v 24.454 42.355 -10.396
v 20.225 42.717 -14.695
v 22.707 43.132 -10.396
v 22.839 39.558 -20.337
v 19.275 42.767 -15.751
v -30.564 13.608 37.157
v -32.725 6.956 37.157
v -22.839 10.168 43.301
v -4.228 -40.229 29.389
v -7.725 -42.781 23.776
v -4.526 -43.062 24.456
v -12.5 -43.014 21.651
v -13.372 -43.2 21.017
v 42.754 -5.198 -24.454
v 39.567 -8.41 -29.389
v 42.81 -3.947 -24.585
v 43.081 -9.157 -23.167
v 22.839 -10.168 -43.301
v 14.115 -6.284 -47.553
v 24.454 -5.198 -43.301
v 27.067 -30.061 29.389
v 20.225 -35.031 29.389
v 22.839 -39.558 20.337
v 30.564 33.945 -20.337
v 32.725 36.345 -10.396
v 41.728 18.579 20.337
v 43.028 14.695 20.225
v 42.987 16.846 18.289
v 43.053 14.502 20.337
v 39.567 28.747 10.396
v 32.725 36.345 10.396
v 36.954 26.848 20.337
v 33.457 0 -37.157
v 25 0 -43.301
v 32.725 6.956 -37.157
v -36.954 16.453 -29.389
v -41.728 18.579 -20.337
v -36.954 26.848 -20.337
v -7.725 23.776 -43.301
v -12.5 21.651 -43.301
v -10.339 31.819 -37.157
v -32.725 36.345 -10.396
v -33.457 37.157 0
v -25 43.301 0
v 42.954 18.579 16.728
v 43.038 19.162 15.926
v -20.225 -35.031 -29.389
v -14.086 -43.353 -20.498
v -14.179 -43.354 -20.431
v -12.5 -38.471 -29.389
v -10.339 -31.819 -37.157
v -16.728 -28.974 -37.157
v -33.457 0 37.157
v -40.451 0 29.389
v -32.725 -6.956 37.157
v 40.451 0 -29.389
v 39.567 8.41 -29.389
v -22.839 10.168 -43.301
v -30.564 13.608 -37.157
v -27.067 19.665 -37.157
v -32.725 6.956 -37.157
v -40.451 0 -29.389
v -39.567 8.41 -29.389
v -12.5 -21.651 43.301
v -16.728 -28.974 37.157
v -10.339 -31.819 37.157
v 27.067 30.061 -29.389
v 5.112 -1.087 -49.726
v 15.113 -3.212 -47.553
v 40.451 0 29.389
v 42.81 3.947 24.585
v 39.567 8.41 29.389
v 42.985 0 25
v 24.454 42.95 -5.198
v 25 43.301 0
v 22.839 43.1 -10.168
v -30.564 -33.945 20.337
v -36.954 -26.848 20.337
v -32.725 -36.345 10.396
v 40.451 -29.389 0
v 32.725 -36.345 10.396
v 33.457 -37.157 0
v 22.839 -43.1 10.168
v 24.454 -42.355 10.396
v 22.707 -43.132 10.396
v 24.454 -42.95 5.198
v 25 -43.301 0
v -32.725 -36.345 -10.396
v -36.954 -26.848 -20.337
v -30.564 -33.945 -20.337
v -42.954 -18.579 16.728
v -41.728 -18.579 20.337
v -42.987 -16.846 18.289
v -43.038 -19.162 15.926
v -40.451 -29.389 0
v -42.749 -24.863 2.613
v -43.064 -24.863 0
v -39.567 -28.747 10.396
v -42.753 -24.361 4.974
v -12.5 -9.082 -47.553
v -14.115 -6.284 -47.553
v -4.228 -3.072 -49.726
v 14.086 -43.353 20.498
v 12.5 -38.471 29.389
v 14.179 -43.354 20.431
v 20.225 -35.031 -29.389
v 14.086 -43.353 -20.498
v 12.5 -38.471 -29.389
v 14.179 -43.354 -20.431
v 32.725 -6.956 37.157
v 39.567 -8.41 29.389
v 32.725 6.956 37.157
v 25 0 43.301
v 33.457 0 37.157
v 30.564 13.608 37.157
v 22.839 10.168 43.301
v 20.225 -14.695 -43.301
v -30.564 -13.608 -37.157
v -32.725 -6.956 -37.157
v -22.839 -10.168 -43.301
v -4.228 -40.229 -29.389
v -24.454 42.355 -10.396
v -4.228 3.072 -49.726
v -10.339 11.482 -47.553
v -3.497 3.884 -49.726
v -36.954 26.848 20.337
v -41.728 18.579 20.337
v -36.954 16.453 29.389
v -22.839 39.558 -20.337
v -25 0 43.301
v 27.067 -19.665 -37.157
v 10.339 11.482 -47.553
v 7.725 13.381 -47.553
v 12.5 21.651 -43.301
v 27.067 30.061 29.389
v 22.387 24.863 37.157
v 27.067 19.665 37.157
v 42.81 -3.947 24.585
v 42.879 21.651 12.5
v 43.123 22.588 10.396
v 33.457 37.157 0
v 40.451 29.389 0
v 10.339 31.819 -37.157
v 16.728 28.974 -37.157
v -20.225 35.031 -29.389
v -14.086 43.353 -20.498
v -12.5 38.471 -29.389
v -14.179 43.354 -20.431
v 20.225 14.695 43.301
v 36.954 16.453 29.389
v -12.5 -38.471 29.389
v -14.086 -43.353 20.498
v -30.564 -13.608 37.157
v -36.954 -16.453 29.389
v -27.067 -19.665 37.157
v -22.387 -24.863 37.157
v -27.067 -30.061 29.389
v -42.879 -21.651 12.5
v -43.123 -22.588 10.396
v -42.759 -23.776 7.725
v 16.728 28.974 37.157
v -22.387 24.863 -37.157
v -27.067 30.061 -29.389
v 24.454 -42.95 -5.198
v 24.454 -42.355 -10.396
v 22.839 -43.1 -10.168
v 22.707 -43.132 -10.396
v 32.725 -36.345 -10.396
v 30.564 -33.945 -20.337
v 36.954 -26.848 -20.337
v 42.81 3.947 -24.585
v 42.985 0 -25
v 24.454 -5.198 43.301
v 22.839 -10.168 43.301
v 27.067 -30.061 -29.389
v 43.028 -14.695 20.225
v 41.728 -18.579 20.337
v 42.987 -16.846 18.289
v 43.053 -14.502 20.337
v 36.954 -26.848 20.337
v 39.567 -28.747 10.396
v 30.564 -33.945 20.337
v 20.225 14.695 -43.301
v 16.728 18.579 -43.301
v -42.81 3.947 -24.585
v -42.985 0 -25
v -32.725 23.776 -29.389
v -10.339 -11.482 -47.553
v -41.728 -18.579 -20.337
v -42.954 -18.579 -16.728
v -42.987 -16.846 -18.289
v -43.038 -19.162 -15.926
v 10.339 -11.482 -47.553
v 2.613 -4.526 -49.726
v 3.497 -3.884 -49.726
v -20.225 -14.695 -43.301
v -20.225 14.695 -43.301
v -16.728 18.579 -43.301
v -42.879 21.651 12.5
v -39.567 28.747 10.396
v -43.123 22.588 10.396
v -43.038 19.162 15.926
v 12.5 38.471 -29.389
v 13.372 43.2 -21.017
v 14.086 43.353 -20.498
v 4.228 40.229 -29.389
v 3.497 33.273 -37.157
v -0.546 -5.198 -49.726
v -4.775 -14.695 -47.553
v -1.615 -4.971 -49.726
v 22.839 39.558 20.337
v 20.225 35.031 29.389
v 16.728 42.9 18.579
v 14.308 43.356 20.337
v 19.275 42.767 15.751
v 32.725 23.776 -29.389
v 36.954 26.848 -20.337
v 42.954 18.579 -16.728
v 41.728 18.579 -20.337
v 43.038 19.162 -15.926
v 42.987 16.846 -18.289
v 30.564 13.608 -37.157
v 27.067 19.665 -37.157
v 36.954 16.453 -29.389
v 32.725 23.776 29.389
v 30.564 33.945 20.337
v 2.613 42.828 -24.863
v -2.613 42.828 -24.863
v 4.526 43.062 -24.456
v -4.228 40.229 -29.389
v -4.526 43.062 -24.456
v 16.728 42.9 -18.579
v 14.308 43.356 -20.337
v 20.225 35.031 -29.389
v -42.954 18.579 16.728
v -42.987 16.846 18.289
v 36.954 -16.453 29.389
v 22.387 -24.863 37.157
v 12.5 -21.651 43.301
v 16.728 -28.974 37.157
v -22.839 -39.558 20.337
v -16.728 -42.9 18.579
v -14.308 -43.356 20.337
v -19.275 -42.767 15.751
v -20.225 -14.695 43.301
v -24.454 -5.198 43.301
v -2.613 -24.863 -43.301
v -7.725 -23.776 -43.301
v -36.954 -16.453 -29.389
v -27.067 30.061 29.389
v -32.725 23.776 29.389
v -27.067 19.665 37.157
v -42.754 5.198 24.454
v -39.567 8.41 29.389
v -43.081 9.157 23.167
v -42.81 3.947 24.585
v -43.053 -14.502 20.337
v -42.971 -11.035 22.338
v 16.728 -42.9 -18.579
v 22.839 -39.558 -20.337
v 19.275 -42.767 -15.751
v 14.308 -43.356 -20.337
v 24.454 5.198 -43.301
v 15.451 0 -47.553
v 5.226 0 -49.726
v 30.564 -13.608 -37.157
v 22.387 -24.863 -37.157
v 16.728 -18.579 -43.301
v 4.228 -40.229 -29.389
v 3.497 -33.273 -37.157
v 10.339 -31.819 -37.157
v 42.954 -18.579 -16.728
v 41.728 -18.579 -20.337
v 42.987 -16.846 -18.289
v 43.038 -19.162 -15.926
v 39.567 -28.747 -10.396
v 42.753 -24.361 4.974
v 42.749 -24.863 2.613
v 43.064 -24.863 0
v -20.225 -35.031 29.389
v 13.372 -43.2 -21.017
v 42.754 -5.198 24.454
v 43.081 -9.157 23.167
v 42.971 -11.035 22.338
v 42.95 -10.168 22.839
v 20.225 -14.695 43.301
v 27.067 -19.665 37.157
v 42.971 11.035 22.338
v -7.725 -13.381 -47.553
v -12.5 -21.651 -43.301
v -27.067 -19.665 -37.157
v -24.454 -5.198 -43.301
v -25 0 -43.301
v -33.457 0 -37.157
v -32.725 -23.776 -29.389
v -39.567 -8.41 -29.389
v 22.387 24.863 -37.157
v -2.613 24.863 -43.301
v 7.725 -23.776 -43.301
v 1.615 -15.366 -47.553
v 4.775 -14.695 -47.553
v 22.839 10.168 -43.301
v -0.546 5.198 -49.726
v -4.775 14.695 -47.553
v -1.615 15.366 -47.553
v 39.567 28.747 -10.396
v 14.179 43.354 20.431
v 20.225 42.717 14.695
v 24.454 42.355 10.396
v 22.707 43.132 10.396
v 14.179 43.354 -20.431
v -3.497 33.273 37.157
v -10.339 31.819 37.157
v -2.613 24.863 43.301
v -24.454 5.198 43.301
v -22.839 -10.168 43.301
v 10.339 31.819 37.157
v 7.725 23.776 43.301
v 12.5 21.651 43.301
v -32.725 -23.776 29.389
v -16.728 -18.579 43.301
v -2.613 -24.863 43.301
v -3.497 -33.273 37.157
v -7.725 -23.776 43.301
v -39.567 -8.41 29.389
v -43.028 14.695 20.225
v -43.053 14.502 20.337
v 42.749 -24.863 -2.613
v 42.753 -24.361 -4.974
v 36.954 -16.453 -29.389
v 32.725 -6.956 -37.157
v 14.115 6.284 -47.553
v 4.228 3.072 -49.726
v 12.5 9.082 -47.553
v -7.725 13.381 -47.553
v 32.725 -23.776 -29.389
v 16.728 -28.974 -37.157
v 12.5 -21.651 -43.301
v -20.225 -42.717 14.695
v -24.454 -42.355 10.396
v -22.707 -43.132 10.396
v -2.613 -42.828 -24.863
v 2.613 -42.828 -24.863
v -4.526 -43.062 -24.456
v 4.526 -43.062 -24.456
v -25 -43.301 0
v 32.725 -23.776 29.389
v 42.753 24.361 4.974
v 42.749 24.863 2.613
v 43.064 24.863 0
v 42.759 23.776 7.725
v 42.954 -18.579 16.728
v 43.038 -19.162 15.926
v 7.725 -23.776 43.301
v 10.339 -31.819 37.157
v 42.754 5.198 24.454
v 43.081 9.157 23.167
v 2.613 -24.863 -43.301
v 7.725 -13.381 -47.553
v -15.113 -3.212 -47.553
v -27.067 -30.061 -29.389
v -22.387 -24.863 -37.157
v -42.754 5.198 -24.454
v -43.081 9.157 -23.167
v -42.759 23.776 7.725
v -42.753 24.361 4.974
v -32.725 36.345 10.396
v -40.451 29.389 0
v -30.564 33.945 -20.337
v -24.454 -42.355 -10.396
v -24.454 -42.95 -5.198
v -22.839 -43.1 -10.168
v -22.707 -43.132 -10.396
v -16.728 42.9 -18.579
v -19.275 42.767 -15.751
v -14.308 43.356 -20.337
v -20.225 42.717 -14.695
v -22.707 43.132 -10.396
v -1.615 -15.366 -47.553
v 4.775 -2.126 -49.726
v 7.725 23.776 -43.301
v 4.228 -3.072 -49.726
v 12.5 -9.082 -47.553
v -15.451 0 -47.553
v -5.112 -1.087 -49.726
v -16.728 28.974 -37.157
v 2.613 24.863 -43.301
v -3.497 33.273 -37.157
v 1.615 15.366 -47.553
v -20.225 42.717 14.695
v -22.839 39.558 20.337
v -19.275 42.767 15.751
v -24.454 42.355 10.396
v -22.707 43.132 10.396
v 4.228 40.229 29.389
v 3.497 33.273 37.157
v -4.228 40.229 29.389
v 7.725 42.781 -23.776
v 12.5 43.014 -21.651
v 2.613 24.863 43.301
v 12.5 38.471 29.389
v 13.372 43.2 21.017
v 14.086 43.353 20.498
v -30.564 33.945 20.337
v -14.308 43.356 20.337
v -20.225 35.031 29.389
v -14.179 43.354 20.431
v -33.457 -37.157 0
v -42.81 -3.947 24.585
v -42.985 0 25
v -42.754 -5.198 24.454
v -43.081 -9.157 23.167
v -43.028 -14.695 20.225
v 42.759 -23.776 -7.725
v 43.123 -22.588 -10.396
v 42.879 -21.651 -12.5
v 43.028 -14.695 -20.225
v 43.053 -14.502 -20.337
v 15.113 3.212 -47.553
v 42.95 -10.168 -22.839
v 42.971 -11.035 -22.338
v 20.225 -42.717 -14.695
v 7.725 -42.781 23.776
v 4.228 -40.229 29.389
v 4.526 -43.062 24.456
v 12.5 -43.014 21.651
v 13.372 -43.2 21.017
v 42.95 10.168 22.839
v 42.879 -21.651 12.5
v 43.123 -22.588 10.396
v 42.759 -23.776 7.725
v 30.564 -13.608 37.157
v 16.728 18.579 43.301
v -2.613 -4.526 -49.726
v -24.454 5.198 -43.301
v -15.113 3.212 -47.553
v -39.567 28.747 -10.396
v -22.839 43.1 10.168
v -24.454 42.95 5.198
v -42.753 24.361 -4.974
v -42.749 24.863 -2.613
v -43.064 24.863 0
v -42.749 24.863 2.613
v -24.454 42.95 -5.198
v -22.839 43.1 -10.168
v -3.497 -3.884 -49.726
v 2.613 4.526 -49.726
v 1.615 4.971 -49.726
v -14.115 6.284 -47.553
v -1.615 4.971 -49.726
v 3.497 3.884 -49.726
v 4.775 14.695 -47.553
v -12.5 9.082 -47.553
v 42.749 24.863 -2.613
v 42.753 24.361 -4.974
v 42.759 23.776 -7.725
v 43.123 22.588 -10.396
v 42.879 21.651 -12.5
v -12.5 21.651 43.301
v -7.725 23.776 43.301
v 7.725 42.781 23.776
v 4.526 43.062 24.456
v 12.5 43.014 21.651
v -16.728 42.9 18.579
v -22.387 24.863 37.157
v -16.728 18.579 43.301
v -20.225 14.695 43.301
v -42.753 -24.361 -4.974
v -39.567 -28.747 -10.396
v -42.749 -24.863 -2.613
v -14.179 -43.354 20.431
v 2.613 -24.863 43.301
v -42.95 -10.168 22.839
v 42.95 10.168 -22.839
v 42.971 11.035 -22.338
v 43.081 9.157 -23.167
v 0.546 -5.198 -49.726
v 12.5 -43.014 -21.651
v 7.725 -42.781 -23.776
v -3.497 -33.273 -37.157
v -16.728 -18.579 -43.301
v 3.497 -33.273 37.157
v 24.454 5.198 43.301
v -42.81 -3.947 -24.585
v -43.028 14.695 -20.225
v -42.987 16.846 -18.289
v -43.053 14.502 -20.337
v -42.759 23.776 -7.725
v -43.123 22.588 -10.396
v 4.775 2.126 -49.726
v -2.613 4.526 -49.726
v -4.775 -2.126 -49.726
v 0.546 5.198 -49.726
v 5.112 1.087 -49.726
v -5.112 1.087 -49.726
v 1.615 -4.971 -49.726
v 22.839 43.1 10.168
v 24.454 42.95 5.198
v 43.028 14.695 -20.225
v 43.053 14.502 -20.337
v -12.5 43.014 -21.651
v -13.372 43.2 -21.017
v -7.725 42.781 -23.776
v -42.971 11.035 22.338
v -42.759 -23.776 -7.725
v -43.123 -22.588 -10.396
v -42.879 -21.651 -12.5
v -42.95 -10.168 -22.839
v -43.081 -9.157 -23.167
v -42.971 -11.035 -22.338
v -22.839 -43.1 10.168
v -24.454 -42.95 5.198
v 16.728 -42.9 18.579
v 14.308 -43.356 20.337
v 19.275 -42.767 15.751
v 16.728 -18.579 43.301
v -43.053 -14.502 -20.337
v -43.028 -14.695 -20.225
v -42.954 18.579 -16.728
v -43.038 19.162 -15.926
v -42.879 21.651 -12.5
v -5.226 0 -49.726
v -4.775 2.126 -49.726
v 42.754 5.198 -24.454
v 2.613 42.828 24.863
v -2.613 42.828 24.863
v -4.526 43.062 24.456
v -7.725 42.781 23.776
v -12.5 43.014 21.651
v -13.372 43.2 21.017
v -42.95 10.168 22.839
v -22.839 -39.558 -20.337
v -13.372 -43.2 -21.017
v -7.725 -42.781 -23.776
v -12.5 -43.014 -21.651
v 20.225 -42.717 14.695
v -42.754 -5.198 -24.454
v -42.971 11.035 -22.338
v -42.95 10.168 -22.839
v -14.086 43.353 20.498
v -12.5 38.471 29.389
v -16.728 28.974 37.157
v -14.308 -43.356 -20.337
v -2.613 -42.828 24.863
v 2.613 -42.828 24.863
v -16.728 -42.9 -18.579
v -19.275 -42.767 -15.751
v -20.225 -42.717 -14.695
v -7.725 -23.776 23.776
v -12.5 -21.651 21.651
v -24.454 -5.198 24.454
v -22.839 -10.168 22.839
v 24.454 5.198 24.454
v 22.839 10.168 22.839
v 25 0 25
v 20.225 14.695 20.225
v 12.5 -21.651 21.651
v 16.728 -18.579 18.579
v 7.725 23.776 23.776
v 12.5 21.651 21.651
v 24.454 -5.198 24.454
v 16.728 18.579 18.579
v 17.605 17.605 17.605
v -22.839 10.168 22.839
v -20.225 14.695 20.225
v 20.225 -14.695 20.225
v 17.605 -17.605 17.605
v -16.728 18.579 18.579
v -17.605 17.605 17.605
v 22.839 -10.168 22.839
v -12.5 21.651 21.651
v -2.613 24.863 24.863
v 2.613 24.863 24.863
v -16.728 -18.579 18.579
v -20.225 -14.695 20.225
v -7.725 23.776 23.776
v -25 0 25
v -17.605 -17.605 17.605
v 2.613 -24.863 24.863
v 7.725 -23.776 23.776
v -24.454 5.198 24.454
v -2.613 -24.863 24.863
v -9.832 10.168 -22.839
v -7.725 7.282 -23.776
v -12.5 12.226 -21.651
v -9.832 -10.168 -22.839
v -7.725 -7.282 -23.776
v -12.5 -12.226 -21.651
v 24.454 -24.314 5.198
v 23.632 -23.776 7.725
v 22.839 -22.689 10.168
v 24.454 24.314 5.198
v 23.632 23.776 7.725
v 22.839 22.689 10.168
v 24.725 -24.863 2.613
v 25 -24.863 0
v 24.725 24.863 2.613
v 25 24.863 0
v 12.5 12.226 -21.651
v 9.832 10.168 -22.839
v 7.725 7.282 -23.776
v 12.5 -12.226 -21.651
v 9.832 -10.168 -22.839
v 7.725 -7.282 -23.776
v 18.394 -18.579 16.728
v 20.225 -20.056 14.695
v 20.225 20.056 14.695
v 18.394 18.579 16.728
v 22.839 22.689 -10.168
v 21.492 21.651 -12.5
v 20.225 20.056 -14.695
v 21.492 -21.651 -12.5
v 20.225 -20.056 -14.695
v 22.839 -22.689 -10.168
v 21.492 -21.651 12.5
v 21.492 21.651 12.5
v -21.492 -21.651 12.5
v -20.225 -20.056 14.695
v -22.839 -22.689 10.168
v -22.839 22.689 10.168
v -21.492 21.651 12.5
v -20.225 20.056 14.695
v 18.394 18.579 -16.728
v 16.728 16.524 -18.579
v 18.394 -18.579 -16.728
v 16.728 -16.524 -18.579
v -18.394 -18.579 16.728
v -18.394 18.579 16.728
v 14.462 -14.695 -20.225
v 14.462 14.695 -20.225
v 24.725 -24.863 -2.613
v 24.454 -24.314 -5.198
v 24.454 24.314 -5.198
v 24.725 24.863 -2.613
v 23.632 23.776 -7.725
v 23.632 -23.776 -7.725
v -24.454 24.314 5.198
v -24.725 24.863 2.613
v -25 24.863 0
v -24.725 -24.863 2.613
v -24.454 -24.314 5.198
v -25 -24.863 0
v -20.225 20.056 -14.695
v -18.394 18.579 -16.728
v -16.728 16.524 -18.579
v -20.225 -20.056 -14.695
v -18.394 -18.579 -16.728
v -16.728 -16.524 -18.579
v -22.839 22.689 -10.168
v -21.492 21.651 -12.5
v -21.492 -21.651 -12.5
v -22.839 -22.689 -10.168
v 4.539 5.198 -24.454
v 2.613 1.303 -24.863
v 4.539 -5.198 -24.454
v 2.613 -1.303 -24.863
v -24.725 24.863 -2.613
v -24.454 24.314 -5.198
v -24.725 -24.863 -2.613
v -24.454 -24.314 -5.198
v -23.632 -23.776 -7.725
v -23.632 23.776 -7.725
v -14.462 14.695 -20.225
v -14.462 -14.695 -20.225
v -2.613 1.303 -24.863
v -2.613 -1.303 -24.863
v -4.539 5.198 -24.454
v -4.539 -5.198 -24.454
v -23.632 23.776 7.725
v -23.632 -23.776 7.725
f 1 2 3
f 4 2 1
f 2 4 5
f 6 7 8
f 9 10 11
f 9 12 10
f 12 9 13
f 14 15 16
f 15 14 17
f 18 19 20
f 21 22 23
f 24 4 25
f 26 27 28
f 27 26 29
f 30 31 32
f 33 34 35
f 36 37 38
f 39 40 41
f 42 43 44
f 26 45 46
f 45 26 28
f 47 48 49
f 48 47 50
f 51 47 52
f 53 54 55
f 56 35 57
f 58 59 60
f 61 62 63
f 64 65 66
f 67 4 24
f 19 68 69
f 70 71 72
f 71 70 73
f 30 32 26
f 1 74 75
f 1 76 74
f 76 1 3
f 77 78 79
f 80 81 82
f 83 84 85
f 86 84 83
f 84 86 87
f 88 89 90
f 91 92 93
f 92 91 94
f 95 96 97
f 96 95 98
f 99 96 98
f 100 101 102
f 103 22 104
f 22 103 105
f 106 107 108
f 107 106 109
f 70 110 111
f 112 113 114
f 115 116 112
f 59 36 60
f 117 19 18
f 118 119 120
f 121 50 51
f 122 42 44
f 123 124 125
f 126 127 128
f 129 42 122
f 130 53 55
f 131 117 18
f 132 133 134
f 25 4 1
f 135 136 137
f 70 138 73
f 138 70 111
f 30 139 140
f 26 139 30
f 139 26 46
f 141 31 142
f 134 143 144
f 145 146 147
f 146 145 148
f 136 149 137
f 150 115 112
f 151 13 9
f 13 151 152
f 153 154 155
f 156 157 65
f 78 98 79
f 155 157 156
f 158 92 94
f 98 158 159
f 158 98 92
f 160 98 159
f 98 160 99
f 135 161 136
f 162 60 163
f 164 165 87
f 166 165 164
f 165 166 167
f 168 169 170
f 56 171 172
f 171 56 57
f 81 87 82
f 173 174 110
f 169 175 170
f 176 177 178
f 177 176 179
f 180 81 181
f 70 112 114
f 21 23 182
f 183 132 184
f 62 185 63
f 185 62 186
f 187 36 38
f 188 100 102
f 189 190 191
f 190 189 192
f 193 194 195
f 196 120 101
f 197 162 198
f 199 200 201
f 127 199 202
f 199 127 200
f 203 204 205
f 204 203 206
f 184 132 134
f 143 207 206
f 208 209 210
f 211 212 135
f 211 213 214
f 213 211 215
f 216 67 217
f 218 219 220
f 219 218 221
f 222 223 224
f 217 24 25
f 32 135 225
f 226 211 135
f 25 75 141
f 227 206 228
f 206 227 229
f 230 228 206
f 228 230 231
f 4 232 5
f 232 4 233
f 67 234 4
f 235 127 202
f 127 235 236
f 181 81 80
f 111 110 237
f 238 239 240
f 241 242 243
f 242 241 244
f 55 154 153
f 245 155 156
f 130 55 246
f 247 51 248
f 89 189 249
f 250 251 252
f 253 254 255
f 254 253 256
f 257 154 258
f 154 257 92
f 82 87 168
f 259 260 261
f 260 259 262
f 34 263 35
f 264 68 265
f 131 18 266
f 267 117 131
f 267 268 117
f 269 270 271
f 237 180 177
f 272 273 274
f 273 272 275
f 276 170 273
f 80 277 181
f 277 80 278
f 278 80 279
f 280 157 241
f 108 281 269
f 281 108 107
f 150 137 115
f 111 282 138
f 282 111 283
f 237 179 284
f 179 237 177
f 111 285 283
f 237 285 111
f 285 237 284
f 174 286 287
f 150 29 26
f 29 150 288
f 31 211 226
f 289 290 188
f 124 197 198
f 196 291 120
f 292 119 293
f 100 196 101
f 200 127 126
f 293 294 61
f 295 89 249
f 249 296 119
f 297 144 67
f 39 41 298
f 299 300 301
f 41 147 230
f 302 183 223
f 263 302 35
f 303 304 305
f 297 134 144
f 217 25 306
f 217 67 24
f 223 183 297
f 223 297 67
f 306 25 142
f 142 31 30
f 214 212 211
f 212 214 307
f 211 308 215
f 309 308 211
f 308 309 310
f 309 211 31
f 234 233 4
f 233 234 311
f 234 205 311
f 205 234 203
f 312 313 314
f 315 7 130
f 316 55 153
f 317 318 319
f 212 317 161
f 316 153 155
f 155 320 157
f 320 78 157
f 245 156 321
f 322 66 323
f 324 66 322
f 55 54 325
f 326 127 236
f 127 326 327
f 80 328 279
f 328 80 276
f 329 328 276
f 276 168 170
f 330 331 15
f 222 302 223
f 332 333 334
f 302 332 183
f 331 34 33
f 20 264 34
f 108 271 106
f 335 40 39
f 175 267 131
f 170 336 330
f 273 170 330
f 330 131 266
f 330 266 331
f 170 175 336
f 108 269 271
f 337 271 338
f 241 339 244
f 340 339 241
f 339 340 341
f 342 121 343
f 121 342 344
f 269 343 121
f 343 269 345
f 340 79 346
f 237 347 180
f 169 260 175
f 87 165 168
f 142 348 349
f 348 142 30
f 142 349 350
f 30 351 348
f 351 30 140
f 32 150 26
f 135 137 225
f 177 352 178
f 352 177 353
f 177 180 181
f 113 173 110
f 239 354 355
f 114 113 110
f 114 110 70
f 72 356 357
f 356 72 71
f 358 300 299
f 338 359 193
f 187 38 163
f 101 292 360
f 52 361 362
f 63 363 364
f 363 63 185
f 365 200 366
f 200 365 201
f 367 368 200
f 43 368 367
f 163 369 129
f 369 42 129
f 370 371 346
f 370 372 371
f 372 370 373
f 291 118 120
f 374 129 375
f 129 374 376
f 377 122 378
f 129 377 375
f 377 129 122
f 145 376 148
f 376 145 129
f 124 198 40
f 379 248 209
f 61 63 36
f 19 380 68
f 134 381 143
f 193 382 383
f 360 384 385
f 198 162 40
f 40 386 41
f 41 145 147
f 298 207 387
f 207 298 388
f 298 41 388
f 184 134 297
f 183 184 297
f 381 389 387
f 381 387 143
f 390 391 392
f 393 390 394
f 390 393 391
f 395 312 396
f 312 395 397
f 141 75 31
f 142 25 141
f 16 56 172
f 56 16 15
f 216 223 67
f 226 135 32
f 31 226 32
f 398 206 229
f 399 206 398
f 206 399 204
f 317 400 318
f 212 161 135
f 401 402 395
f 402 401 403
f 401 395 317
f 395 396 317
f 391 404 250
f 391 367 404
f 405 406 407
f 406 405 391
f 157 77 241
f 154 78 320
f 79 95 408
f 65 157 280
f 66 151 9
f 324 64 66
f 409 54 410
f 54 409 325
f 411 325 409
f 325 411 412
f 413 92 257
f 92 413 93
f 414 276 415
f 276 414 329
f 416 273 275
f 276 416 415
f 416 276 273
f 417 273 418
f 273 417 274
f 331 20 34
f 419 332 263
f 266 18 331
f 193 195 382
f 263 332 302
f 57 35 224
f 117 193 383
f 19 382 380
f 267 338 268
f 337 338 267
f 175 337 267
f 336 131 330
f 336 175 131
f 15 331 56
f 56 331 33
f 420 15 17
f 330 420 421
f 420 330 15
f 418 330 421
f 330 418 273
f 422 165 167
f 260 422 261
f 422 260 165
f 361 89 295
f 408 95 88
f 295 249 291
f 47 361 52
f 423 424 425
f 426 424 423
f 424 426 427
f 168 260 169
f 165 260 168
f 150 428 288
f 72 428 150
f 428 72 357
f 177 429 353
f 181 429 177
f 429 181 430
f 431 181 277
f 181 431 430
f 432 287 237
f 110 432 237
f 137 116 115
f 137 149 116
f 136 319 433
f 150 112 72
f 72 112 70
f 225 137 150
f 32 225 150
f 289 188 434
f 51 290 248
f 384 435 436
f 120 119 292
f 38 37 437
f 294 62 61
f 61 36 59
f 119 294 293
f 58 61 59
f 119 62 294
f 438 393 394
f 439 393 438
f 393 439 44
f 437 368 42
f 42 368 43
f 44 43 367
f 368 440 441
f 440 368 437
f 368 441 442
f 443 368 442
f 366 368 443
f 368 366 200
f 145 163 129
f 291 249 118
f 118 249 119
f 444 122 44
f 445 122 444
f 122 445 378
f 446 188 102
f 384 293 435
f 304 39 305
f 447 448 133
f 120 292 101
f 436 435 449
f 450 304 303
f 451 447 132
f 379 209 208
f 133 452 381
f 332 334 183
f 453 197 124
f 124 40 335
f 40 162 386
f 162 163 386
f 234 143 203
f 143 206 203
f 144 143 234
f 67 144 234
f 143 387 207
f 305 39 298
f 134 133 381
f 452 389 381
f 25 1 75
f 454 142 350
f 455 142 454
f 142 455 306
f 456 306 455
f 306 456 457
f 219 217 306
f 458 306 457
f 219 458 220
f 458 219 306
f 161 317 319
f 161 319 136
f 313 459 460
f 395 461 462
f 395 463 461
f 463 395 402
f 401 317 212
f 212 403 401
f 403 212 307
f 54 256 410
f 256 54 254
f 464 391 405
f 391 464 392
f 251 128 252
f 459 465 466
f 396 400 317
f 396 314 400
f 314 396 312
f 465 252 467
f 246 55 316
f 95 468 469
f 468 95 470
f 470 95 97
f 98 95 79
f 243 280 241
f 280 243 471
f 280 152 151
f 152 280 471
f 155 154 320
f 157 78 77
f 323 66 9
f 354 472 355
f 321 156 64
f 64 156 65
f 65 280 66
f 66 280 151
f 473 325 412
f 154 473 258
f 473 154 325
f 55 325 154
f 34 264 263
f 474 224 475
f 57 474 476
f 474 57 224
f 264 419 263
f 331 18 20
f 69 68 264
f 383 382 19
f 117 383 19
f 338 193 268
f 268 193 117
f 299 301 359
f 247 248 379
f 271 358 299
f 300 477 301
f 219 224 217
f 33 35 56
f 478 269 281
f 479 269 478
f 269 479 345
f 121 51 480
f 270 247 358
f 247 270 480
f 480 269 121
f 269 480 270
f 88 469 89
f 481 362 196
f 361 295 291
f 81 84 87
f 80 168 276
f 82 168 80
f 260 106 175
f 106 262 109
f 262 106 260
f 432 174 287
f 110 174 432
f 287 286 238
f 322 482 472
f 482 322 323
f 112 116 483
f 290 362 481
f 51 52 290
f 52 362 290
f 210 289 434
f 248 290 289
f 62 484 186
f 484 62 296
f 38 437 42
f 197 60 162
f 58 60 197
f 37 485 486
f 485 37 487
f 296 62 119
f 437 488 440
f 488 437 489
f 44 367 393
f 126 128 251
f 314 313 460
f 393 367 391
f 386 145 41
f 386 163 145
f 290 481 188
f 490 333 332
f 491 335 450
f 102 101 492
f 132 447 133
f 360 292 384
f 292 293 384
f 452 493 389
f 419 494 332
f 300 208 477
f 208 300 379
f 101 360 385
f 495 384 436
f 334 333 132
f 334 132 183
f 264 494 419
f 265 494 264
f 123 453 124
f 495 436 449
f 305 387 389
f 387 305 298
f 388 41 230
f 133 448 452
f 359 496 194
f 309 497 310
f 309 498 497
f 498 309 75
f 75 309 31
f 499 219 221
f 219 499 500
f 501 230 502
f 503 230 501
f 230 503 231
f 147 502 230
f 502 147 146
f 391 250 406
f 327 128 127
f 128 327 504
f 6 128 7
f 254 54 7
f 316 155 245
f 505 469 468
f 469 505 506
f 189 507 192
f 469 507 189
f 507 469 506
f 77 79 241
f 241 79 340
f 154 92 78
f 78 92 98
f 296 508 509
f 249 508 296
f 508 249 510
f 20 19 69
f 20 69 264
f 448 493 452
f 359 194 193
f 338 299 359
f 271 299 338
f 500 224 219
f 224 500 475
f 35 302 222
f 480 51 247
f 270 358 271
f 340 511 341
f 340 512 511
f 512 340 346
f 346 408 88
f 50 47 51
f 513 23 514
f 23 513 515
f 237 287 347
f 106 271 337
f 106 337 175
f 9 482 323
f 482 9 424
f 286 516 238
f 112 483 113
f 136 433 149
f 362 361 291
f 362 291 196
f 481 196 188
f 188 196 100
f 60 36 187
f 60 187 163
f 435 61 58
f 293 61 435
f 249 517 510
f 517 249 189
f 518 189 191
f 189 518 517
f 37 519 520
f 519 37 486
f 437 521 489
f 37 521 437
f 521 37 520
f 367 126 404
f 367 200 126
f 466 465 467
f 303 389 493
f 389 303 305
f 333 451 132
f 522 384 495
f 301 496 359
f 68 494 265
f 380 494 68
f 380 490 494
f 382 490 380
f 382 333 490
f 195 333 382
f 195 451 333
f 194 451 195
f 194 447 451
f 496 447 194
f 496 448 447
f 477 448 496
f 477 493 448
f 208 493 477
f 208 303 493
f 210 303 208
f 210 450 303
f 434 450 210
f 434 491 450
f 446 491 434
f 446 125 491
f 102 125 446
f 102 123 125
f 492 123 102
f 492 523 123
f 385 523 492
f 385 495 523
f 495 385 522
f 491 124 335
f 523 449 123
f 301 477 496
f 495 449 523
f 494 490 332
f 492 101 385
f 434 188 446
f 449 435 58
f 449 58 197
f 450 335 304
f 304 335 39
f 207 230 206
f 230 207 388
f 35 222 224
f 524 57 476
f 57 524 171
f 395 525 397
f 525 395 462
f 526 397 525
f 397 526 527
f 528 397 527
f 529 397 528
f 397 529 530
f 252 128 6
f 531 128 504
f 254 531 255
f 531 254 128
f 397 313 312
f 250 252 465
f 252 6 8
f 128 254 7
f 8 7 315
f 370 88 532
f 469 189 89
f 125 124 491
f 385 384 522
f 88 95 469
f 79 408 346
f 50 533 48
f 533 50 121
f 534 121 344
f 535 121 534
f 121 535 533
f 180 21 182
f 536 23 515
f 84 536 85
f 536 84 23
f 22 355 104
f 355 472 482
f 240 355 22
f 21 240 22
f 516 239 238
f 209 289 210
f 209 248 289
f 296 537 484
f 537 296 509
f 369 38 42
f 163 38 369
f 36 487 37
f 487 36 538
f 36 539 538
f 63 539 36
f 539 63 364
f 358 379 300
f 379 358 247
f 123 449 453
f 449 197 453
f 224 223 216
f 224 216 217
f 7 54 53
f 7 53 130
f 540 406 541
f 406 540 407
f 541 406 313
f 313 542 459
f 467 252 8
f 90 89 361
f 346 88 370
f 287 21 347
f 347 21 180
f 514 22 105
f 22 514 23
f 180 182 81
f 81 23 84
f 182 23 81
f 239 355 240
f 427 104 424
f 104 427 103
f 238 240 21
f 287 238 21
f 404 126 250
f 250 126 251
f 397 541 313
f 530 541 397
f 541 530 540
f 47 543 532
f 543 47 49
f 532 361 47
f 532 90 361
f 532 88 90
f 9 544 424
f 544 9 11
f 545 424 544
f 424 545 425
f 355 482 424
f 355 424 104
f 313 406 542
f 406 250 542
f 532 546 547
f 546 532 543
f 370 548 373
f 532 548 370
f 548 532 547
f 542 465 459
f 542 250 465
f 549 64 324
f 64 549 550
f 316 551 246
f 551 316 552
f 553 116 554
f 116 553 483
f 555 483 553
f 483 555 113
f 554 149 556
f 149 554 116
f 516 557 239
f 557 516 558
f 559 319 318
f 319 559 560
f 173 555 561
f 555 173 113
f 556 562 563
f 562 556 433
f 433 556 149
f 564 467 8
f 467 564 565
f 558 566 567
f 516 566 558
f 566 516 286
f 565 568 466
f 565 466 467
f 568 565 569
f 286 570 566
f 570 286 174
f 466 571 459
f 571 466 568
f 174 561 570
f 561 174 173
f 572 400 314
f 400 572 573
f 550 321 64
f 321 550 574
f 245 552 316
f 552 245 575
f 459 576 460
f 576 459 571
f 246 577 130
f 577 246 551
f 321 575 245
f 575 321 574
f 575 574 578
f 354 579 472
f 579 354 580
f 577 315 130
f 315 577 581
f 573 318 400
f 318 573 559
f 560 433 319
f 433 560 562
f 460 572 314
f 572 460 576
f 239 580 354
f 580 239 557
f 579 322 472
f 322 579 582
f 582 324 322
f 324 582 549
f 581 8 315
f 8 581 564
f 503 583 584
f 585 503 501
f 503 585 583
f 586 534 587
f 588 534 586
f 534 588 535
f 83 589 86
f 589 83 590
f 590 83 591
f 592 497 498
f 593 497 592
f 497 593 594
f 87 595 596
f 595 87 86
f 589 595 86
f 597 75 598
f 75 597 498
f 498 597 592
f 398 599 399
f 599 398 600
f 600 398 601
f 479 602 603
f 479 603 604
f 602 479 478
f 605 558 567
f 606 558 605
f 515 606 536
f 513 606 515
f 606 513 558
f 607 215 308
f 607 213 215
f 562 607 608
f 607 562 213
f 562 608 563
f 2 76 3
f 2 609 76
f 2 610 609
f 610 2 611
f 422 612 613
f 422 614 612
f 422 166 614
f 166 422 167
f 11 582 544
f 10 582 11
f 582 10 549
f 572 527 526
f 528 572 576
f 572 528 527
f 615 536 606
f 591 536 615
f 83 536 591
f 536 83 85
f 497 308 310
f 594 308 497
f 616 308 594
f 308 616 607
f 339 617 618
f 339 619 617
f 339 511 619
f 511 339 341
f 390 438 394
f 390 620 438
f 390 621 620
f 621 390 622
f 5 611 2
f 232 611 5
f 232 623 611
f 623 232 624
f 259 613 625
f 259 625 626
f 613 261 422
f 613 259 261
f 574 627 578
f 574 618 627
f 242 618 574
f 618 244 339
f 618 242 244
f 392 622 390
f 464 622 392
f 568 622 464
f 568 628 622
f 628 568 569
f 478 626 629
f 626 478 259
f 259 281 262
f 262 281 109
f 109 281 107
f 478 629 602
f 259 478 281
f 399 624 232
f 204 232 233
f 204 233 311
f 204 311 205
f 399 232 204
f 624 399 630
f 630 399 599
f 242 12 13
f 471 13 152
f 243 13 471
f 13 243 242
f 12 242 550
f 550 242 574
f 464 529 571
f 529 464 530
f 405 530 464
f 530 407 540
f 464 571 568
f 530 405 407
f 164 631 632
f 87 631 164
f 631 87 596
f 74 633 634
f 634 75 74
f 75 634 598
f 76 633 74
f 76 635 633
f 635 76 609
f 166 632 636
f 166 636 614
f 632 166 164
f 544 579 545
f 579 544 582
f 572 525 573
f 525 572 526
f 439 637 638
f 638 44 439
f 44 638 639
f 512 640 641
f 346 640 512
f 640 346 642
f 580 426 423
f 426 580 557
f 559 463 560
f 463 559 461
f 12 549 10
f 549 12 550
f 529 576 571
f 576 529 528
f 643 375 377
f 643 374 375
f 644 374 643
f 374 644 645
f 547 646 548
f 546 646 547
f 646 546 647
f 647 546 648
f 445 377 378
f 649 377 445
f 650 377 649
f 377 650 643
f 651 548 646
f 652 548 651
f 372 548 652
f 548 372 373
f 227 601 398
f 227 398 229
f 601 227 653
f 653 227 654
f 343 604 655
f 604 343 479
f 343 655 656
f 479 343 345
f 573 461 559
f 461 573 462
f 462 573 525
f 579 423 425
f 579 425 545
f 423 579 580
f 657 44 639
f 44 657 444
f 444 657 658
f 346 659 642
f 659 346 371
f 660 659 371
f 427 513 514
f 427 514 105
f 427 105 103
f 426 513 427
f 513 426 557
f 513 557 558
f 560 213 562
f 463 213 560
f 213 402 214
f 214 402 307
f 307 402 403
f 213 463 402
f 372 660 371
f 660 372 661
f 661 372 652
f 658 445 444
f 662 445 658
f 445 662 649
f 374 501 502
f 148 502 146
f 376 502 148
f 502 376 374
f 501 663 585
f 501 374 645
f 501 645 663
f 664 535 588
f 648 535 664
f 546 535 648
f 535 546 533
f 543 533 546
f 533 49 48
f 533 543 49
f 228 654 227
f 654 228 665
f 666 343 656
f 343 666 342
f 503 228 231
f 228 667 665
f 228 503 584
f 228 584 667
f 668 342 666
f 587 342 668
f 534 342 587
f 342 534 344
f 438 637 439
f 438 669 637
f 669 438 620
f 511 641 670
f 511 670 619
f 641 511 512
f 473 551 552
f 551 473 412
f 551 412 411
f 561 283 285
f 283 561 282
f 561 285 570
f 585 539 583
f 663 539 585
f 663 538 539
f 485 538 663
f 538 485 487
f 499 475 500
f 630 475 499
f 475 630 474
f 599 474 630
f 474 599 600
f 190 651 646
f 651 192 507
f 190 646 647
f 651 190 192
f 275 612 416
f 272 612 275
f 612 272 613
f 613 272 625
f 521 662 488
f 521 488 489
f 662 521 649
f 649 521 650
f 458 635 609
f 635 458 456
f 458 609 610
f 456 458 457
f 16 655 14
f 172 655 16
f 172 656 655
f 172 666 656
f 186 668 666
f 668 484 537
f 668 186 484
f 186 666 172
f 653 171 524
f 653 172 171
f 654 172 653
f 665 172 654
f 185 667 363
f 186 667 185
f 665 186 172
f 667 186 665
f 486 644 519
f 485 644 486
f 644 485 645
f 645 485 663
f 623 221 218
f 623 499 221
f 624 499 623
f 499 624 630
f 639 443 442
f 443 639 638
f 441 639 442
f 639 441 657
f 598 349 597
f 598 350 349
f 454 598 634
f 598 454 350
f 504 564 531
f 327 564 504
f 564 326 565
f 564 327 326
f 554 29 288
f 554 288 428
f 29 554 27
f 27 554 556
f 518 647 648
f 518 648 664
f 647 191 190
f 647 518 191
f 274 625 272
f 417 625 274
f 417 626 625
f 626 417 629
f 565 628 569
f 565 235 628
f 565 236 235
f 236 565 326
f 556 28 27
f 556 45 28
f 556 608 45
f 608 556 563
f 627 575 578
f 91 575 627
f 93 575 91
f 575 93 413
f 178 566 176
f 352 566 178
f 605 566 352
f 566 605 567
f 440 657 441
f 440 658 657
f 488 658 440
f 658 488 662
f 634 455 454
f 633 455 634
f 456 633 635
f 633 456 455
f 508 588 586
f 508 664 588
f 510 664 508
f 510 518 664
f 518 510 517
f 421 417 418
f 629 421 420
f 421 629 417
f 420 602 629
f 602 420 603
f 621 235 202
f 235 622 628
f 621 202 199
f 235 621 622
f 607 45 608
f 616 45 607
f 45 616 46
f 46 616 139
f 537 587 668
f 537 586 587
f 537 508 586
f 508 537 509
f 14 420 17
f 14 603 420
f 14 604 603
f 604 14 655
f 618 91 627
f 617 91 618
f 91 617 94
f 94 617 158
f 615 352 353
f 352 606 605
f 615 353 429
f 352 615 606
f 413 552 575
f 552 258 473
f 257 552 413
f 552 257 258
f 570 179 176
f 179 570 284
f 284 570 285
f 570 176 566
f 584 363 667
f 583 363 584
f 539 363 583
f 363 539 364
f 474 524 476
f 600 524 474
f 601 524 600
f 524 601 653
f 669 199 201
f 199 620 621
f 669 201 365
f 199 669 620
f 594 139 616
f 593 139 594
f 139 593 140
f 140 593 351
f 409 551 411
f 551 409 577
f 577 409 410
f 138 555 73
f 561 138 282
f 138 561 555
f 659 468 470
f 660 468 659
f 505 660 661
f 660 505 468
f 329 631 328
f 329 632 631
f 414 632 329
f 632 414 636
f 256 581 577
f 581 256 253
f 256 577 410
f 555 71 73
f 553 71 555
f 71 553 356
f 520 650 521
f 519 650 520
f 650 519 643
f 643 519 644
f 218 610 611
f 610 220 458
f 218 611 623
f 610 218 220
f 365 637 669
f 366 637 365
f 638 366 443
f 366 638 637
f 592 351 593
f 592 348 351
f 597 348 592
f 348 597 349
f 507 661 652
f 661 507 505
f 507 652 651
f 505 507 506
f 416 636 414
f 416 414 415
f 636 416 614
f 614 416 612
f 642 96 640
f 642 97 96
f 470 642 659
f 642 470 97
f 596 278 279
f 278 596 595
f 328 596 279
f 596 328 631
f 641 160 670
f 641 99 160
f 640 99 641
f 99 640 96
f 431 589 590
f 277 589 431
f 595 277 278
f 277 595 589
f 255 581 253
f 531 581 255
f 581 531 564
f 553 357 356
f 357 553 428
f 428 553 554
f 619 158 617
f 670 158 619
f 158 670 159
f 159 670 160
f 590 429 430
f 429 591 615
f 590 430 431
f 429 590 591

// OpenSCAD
difference() {
    sphere(d=100);
    
    cylinder(d=50, h=125, center1=true, r2=true);
    #rotate([90, 0, 0]) cylinder(r1=25, r2=25, h=125, center=true);
    rotate([0, 90, 0]) cylinder(r1=25, r2=25, h=125, center=true);
}
